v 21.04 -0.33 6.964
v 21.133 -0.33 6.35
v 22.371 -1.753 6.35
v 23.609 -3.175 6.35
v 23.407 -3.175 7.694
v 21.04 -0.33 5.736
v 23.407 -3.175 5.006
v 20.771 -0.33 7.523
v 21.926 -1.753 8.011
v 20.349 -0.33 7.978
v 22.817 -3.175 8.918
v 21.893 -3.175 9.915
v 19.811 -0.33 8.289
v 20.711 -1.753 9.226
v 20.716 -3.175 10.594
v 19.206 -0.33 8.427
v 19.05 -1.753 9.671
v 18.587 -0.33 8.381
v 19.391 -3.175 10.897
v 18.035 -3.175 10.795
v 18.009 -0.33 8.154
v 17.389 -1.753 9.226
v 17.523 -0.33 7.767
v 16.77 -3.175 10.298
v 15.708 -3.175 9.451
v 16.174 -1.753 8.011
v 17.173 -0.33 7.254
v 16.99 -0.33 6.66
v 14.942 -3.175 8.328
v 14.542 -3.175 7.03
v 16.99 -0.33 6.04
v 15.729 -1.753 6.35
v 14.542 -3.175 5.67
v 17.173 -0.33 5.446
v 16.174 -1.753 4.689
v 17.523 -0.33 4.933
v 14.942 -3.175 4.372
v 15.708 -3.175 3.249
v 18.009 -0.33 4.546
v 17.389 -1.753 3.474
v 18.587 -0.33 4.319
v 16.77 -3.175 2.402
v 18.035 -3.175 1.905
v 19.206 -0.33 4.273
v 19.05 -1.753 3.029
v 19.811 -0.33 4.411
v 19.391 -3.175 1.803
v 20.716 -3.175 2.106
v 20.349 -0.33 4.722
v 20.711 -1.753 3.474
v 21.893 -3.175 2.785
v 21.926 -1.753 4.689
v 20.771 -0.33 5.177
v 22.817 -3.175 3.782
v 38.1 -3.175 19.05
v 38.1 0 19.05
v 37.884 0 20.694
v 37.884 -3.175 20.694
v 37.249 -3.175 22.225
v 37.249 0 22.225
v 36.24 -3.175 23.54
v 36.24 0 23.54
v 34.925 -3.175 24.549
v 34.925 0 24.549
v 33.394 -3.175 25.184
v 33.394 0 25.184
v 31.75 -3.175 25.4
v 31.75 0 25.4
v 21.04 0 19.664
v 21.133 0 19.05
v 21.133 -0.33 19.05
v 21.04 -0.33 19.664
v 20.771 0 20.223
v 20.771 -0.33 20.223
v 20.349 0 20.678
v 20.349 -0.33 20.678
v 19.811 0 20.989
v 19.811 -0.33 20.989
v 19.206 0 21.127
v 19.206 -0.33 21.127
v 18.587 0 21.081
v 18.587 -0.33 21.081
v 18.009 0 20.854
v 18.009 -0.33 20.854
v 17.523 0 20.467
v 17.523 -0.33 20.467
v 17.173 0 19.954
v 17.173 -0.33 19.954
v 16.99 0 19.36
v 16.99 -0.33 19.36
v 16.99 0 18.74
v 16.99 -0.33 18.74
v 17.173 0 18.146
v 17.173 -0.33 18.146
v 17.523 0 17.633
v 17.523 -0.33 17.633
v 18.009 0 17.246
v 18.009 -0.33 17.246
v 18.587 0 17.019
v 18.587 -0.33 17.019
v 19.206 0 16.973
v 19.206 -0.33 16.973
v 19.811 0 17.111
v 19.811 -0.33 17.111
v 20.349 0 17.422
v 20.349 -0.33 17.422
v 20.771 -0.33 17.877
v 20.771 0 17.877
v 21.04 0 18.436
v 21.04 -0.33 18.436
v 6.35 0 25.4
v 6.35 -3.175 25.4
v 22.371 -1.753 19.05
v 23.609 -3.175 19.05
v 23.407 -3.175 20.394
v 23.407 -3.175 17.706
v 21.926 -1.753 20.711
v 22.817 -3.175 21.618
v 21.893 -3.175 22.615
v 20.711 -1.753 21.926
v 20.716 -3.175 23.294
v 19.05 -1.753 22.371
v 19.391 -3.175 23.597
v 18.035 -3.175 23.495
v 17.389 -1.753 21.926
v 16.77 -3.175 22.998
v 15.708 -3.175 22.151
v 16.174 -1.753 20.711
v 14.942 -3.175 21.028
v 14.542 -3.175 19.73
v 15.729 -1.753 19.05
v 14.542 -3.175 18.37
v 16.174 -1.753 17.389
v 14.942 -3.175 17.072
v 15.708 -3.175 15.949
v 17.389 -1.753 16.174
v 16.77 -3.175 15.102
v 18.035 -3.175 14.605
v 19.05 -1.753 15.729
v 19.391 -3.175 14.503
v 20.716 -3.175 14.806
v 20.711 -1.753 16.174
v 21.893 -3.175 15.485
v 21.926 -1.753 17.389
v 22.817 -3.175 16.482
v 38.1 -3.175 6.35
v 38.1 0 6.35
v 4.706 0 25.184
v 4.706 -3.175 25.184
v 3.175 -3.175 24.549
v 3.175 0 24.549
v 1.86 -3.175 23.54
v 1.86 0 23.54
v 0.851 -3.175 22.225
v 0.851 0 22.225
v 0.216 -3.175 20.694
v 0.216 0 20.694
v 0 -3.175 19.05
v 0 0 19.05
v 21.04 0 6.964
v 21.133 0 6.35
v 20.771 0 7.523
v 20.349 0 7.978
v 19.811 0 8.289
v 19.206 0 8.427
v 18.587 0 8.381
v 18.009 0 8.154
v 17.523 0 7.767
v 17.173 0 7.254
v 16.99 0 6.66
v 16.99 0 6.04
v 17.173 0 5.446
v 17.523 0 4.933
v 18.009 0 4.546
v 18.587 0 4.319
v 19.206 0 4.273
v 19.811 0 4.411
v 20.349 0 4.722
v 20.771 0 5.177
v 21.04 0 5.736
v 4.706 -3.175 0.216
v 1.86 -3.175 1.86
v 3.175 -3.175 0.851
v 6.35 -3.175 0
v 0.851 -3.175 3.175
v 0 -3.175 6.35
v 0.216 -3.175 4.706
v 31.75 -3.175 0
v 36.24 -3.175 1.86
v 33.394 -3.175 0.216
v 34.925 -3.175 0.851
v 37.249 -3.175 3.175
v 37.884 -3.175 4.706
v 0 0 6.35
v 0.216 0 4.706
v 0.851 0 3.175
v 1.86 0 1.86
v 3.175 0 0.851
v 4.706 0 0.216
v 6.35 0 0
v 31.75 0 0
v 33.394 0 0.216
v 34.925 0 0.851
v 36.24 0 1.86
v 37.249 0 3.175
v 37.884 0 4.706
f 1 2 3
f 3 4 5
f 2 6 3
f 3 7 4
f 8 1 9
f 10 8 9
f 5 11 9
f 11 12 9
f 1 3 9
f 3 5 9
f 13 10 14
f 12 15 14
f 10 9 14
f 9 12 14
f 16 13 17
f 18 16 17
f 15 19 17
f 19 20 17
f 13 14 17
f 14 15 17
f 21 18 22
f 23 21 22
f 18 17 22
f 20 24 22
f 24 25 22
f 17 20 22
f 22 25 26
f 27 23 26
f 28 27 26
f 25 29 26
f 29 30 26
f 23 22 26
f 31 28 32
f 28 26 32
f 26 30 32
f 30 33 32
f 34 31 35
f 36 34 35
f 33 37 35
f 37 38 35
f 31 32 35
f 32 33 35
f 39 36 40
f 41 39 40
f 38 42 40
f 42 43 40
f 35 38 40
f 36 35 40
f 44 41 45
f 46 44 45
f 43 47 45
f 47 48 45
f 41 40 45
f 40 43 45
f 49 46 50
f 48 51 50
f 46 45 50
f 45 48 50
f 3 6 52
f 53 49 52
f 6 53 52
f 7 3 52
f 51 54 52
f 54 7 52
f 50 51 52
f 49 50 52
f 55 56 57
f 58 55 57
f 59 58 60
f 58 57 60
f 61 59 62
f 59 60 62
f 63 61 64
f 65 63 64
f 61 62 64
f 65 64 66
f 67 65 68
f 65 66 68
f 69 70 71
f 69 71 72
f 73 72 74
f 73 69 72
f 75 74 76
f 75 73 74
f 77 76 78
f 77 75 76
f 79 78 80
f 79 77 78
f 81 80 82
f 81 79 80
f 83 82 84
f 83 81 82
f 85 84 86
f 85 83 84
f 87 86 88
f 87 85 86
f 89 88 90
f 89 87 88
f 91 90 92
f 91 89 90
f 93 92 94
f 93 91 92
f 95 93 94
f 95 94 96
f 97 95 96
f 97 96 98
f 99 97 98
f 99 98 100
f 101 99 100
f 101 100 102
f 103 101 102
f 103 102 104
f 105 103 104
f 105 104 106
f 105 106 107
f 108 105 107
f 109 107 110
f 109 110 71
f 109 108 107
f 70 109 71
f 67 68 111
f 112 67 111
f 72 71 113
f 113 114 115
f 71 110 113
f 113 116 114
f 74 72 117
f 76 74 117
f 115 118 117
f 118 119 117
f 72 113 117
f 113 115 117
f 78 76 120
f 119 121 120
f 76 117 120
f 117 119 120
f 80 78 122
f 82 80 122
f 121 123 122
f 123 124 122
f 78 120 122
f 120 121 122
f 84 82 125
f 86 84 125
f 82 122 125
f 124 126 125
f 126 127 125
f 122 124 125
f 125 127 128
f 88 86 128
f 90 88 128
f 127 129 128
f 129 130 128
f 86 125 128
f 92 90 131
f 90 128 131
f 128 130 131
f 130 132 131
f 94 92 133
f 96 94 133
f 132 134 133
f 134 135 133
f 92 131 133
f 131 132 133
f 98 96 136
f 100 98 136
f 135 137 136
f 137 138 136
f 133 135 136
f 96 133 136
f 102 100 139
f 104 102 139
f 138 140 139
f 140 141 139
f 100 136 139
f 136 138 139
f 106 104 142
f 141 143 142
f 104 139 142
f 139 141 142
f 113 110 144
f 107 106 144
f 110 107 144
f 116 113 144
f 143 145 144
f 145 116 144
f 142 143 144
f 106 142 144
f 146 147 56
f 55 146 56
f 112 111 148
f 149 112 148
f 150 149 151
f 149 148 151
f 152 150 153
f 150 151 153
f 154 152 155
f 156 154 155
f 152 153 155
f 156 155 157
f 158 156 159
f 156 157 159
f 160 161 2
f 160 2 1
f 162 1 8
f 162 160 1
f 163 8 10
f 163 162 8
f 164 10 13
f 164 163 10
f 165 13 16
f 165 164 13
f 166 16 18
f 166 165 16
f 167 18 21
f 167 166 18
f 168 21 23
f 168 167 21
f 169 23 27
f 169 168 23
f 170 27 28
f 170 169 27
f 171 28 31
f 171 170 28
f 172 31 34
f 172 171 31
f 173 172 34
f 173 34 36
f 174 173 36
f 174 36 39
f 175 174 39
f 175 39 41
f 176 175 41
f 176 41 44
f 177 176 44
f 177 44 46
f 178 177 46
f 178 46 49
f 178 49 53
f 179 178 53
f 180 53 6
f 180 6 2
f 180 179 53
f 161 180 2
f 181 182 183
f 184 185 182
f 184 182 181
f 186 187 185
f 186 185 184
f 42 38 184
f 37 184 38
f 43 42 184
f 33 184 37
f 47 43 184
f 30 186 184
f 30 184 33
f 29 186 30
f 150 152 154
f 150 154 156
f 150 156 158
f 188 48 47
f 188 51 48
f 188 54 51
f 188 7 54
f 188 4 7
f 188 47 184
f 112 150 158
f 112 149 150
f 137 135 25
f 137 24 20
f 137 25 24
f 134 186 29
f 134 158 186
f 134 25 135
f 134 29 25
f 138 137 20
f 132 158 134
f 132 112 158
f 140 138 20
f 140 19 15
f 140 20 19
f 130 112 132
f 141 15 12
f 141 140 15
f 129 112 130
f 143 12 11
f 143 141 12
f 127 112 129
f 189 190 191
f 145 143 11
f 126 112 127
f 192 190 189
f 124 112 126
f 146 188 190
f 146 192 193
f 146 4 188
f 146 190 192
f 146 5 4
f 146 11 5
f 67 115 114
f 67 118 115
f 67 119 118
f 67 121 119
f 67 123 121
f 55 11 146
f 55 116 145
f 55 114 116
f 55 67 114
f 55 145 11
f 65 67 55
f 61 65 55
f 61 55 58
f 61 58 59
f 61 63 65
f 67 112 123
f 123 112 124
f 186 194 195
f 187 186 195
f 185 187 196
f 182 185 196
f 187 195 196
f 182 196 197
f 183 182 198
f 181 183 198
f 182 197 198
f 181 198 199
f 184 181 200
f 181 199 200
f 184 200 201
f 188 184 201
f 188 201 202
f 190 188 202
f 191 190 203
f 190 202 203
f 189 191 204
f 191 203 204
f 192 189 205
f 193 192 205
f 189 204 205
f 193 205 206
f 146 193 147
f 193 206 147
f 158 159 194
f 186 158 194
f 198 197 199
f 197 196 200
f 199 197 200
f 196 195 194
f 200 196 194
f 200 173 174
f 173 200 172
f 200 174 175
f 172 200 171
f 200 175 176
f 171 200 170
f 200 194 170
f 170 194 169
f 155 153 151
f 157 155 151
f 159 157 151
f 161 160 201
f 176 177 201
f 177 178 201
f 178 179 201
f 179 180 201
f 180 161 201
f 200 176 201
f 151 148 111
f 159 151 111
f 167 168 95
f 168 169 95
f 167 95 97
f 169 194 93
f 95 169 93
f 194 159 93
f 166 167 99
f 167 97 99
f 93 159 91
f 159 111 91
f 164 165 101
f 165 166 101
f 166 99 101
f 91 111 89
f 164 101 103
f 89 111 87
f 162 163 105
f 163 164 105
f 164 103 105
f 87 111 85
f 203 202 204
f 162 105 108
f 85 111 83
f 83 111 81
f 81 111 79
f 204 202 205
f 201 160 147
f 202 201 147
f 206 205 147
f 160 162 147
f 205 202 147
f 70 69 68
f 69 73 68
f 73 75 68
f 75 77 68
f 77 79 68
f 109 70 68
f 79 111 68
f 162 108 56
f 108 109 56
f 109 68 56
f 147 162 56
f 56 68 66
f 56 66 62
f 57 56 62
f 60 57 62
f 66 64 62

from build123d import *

# Parameters (mm, degrees)
F0_R     = 2.0828
F1_DEPTH = 3.175
F2_SIZE2 = 2.4765
F2_SIZE  = 2.8448


with BuildPart() as f1:
    # F0 (on Front) → F1 (new body)
    with BuildSketch(Plane.XZ):
        with BuildLine():
            ThreePointArc((0, 6.35), (1.859872, 1.859872), (6.35, 0))
            Line((6.35, 0), (31.75, 0))
            ThreePointArc((31.75, 0), (36.240128, 1.859872), (38.1, 6.35))
            Line((38.1, 6.35), (38.1, 19.05))
            ThreePointArc((38.1, 19.05), (36.240128, 23.540128), (31.75, 25.4))
            Line((31.75, 25.4), (6.35, 25.4))
            ThreePointArc((6.35, 25.4), (1.859872, 23.540128), (0, 19.05))
            Line((0, 19.05), (0, 6.35))
        make_face()
        with Locations((19.05, 6.35)):
            Circle(F0_R, mode=Mode.SUBTRACT)
        with Locations((19.05, 19.05)):
            Circle(F0_R, mode=Mode.SUBTRACT)
    extrude(amount=F1_DEPTH)

    # F2
    f2_edges = [f1.edges().sort_by_distance(p)[0] for p in [
        (16.9672, -3.175, 19.05),
        (16.9672, -3.175, 6.35),
    ]]
    chamfer(f2_edges, length=F2_SIZE, length2=F2_SIZE2)


solid = f1.part
